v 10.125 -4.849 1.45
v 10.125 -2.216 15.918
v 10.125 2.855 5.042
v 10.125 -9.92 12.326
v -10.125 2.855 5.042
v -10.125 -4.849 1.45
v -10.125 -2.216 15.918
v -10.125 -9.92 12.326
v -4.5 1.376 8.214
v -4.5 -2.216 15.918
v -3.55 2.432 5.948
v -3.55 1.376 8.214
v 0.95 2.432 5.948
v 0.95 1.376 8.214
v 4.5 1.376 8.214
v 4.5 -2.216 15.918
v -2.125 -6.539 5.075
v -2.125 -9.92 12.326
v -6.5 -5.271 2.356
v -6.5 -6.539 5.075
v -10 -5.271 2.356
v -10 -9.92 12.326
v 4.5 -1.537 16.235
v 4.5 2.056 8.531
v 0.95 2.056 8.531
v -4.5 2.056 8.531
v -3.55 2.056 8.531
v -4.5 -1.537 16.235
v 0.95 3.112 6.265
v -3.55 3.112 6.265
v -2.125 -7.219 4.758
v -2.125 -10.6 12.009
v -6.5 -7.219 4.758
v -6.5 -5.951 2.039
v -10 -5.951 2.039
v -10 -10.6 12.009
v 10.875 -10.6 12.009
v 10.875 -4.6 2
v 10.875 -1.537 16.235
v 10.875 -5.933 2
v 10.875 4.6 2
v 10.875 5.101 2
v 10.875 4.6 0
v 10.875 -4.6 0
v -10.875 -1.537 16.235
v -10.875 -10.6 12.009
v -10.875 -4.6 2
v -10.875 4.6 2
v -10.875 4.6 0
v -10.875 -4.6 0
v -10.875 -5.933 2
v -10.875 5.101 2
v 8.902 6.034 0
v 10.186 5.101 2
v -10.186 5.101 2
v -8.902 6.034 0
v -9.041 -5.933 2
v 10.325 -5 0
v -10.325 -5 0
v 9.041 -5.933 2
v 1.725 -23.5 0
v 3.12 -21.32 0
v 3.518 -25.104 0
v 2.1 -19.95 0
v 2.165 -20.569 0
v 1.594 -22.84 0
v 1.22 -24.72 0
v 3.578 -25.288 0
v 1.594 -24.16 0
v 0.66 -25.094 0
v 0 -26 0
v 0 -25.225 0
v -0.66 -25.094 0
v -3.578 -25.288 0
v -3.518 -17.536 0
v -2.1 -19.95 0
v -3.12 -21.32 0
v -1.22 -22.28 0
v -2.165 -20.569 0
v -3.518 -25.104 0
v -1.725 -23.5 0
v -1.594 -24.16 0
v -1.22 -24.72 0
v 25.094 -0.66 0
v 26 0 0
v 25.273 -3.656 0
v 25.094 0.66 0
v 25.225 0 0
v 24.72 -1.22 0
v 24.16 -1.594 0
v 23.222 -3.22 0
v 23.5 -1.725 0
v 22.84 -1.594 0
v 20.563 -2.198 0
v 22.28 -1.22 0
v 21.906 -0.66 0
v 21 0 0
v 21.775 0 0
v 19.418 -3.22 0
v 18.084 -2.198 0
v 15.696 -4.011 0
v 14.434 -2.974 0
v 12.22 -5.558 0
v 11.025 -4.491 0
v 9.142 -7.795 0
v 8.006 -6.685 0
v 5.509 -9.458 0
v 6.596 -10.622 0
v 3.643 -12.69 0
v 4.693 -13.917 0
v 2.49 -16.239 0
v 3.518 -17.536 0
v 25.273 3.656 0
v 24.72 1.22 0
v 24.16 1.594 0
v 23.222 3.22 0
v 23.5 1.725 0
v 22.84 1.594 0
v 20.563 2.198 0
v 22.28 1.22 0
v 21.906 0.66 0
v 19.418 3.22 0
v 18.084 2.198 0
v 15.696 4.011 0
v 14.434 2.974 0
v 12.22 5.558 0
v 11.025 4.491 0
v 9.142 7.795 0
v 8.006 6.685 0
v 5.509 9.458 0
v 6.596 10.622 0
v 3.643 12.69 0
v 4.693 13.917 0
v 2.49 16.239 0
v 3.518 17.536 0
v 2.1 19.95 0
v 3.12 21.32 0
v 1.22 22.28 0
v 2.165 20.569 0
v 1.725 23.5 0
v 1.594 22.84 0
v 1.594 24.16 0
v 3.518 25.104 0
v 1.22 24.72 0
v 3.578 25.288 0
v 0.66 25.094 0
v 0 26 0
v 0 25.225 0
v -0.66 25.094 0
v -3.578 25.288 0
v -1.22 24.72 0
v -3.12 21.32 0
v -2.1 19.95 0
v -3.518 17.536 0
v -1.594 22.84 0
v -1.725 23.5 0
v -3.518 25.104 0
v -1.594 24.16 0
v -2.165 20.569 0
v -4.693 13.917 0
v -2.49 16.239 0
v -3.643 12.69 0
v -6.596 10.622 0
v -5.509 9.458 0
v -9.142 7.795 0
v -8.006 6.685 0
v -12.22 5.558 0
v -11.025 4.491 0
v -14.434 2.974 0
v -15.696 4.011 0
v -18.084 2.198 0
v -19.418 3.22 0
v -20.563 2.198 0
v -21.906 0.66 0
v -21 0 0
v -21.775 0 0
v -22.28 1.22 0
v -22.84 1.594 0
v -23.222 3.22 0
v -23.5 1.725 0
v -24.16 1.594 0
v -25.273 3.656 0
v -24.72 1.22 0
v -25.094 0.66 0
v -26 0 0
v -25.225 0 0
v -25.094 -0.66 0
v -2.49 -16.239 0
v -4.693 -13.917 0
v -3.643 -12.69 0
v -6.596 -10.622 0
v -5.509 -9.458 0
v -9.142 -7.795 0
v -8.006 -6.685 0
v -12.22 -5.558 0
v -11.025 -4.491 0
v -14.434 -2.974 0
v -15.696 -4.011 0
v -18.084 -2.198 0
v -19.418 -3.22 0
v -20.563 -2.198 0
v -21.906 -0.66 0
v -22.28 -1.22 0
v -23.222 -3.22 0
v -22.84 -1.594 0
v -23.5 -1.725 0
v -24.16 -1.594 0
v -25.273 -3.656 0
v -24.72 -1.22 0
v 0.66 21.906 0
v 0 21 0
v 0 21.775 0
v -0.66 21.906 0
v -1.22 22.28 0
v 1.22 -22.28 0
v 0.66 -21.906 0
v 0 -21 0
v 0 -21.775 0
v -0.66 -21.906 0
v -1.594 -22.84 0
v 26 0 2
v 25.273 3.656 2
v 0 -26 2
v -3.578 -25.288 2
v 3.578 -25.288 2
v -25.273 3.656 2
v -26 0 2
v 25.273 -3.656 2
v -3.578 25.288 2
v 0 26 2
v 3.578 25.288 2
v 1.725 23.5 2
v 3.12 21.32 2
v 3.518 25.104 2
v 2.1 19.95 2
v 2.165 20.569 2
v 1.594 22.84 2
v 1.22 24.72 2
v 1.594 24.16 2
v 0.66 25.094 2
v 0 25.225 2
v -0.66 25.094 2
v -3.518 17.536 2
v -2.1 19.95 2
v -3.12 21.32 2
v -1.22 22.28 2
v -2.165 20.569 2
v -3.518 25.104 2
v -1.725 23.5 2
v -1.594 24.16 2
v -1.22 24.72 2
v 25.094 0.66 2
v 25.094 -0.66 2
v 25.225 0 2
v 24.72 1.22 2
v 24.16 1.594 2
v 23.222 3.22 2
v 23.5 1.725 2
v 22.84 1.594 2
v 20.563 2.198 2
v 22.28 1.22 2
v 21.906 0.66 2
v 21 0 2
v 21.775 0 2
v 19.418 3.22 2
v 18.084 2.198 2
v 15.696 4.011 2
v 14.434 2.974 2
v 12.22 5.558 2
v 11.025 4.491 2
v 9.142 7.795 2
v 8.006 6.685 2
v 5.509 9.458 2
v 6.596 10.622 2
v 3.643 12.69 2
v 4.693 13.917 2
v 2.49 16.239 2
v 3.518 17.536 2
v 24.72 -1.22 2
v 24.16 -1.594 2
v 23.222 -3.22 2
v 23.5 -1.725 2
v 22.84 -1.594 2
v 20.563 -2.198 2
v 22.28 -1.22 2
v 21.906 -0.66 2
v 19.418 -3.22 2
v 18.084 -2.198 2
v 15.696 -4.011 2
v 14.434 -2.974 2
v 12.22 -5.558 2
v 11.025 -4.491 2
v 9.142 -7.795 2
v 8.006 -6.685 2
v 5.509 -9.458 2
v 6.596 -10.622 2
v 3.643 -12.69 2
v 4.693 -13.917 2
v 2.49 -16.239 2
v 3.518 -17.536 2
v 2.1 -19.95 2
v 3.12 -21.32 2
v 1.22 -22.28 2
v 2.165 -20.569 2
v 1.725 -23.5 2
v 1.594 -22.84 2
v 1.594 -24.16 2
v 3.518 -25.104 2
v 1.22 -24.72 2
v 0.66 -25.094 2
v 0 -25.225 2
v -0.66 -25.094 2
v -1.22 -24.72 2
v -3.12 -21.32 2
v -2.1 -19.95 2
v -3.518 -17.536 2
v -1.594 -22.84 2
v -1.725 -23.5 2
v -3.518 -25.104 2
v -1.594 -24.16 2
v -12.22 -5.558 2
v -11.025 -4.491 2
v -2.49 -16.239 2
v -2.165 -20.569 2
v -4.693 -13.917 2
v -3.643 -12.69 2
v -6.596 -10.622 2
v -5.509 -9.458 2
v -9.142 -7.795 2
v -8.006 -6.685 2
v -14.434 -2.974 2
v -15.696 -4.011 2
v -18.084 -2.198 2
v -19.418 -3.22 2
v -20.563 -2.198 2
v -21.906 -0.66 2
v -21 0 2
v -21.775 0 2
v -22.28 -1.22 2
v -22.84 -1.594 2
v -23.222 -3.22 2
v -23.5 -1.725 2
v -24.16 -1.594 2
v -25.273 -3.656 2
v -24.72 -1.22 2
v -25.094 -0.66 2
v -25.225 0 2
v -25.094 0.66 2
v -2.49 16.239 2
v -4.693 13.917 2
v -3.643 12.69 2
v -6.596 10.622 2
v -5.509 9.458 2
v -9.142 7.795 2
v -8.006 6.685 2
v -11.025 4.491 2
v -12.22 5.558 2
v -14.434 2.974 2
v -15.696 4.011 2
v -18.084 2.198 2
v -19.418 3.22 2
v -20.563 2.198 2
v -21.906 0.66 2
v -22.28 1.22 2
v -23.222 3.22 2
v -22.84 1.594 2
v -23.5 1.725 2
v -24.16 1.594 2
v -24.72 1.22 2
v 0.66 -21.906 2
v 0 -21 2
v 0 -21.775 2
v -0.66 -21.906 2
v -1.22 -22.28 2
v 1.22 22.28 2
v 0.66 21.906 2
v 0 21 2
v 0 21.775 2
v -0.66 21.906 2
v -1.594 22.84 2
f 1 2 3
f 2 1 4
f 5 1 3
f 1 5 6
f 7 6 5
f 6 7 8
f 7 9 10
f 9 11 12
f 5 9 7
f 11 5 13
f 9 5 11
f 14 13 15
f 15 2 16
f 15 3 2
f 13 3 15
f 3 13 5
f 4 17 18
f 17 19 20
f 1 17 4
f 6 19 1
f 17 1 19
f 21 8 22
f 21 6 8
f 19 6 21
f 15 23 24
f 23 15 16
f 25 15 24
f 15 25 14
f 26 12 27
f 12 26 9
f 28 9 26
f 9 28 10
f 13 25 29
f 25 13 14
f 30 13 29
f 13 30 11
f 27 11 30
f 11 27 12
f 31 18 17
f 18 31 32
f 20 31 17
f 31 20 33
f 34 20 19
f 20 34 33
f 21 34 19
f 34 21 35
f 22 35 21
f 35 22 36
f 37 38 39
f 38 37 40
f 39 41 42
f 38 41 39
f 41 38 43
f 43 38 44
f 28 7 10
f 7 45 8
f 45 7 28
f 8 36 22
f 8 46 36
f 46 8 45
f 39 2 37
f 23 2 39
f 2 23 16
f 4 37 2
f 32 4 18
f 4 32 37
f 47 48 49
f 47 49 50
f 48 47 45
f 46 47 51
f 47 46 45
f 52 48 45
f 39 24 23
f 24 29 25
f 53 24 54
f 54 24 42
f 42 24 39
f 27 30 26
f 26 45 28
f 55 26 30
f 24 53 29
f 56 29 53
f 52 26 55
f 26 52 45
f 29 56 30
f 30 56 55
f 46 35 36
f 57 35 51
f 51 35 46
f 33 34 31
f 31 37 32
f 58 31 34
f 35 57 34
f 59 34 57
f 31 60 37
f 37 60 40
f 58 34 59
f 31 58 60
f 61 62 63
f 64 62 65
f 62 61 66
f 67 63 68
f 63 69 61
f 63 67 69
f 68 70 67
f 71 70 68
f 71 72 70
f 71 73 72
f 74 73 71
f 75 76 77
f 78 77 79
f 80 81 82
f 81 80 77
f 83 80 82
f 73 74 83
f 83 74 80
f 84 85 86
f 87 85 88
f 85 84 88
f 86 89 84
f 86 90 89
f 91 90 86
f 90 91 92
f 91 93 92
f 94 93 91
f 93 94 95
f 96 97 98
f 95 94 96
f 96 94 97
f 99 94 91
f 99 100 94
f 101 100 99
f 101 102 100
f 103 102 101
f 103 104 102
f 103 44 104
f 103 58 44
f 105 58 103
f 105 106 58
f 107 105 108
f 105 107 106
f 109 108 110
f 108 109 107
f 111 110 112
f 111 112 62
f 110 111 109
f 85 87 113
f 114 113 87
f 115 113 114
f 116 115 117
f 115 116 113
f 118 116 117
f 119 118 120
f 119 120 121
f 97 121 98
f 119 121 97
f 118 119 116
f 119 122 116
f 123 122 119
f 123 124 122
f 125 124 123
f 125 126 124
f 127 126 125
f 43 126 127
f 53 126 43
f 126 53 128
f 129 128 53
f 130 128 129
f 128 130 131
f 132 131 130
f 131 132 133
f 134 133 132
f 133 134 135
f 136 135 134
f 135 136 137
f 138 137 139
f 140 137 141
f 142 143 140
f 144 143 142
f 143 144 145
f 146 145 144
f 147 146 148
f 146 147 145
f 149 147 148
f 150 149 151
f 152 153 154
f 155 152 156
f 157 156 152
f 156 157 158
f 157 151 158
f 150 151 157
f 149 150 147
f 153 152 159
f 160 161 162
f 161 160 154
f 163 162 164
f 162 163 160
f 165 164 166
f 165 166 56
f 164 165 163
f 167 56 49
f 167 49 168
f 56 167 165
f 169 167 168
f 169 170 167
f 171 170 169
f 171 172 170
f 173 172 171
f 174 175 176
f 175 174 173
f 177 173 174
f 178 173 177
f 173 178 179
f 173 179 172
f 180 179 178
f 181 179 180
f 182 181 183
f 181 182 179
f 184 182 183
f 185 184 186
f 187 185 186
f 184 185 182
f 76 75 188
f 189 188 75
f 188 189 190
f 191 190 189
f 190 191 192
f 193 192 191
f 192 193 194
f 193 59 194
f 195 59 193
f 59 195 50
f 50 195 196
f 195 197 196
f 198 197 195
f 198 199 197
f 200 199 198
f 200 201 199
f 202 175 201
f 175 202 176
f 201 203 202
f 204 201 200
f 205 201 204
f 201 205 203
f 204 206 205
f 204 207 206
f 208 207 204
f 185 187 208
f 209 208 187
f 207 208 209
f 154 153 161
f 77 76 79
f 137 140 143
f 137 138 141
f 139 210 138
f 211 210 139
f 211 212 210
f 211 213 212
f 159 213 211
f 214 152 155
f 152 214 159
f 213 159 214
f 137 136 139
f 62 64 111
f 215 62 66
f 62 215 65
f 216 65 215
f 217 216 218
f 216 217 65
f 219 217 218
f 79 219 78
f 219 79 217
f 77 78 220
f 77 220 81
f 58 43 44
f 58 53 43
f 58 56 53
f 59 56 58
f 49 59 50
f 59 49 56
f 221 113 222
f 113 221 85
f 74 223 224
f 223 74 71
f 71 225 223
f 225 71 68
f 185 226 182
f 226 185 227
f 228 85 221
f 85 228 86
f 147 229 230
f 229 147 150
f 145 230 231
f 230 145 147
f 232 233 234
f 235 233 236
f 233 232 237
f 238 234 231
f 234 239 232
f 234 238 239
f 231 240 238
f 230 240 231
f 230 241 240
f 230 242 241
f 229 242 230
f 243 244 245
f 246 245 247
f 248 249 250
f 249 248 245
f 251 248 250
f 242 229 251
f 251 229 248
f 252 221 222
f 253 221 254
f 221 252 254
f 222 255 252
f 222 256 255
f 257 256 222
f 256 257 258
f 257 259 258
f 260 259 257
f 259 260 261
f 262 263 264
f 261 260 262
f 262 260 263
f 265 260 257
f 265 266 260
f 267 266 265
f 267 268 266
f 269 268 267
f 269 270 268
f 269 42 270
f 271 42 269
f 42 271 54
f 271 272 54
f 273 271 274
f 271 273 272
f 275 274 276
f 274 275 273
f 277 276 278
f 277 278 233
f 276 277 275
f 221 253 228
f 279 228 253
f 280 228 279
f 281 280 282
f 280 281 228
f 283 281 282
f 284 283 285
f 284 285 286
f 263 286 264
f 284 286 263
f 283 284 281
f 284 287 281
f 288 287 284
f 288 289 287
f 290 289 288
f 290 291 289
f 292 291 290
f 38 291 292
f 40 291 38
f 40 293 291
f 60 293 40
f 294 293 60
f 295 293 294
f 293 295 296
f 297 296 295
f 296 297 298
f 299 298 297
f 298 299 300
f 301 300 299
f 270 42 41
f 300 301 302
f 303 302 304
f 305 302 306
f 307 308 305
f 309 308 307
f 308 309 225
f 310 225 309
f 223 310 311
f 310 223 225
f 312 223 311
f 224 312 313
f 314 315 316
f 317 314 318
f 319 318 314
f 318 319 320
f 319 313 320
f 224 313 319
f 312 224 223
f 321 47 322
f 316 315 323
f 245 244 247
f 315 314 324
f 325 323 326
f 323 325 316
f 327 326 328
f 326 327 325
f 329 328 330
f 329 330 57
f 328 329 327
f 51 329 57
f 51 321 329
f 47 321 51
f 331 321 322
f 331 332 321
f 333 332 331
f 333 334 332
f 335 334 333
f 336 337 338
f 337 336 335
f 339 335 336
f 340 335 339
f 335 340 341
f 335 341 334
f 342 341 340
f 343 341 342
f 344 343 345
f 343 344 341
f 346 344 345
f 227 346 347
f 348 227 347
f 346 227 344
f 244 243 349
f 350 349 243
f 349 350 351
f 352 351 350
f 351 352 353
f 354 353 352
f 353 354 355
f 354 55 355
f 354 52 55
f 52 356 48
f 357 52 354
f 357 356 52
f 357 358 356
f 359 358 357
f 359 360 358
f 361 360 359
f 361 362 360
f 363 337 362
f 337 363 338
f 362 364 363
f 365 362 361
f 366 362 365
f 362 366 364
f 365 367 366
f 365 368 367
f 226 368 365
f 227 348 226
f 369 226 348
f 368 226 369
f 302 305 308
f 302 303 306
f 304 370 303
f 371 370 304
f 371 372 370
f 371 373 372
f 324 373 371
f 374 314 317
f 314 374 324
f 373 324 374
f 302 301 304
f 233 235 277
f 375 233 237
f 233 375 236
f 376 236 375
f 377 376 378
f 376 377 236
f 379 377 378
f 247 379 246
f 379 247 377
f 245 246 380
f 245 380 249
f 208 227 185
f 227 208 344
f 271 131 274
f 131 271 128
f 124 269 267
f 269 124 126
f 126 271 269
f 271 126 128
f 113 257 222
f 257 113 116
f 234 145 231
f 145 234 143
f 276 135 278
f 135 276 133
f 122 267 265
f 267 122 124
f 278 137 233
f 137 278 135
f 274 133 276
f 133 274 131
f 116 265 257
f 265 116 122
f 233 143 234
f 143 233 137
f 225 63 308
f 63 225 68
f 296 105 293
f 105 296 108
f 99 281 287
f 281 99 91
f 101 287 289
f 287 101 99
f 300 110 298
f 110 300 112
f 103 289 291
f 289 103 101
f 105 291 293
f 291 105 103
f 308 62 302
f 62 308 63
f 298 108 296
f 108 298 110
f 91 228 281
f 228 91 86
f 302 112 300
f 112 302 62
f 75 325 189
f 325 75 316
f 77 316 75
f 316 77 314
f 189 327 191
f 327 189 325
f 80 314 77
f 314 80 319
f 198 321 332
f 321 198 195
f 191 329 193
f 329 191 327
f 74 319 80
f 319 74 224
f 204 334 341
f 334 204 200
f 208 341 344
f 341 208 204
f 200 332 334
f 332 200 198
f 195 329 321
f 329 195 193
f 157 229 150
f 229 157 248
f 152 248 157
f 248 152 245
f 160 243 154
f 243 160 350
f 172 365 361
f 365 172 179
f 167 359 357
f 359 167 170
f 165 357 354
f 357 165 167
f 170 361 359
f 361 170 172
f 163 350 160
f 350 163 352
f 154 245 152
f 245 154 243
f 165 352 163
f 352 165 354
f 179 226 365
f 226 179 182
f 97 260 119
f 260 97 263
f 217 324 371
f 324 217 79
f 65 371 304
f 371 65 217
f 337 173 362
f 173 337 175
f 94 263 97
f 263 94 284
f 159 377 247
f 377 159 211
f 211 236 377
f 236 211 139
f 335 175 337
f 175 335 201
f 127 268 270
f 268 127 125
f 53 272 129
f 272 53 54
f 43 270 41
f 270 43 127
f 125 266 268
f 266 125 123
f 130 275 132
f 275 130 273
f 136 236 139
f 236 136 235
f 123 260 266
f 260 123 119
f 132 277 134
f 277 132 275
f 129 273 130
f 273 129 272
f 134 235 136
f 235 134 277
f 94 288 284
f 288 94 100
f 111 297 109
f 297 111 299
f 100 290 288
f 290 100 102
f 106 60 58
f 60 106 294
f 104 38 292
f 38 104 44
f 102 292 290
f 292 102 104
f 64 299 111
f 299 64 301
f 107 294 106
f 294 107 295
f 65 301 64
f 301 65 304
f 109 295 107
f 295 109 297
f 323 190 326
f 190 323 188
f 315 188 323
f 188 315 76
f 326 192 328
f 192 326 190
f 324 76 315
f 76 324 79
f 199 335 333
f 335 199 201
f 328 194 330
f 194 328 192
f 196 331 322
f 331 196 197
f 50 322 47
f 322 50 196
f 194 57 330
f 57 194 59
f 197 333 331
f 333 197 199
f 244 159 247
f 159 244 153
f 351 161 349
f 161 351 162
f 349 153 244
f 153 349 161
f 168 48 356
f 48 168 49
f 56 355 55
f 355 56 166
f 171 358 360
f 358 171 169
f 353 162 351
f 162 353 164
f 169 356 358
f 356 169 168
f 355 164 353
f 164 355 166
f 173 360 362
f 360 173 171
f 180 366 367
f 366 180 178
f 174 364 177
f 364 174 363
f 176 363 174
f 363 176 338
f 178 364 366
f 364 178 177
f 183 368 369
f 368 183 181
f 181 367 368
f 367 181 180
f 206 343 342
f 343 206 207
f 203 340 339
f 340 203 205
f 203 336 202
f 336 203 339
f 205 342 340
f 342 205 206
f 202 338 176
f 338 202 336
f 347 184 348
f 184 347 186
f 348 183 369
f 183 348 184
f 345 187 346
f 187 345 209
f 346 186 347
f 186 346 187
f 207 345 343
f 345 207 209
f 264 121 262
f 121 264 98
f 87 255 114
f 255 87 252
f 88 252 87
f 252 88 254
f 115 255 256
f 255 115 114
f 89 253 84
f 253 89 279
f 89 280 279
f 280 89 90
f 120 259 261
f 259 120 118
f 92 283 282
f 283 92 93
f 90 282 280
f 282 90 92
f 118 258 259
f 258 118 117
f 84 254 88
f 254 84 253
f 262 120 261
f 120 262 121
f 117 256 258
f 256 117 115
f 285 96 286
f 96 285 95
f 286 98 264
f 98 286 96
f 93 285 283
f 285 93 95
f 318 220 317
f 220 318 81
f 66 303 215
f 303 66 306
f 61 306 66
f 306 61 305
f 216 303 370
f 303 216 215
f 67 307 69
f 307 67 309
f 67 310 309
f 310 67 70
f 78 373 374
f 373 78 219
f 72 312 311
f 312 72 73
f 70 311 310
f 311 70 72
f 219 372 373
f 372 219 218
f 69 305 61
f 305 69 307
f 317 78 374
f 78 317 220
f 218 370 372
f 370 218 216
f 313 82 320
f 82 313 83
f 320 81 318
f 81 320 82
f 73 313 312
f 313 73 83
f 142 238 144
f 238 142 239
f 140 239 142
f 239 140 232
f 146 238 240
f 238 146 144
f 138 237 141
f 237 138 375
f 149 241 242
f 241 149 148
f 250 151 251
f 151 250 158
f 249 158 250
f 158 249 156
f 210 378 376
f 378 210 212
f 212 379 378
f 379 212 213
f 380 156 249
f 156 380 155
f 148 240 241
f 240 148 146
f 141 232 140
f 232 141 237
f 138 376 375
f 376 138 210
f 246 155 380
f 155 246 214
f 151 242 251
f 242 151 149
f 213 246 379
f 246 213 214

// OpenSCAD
/* [Camera box] */

// Camera box angle
CAMERABOX_ANGLE = 25;
// Camera box height
CAMERABOX_HEIGHT = 12;
// Camera box wall thickness
CAMERABOX_WALL_THICKNESS = 1.5;
// Extra height at bottom of the box
CAMERABOX_ZOFFSET = 1.25;

/* [Customize camera] */
// Draw camera (debug mode)
CAMERA_DEBUG="false";

// Camera width
CAMERA_WIDTH = 20.25;
// Camera depth
CAMERA_DEPTH = 8.5;
// Camera height
CAMERA_HEIGHT = 14;

// Lens width
CAMERA_LENS_WIDTH = 9;
// Lens height
CAMERA_LENS_HEIGHT = 7;
// Lens depth
CAMERA_LENS_DEPTH = 7;
// Lens cutout offset X from center of camera
CAMERA_LENS_XOFFSET = 0;
// Lens offset Z from center of camera
CAMERA_LENS_ZOFFSET = 0;

// Front capacitor width
CAMERA_CAP_WIDTH=4.5;
// Front capacitor height
CAMERA_CAP_HEIGHT = 2.5;
// Front capacitor depth
CAMERA_CAP_DEPTH = 1.5;
// Front capacitor X offset from center of lens
CAMERA_CAP_XOFFSET = -1.3;
// Front capacitor Y offset from center of the lens
CAMERA_CAP_ZOFFSET = -4.75;

// Rear LCD width
CAMERA_LCD_WIDTH = 7.75;
// Rear LCD height
CAMERA_LCD_HEIGHT = 9;
// Rear LCD depth
CAMERA_LCD_DEPTH = 2;
// Rear LCD X offset
CAMERA_LCD_XOFFSET = -6;
// Rear LCD Z offset
CAMERA_LCD_ZOFFSET = 1.5;

// Power cord's connector width
CAMERA_POWERCORD_WIDTH=3.5;
// Power cord's connector height
CAMERA_POWERCORD_HEIGHT=2;
// Power cord's connector depth
CAMERA_POWERCORD_DEPTH=1.5;
// Power cord's hole X offset
CAMERA_POWERCORD_XOFFSET = -8.25;
// Power cord's hole z offset
CAMERA_POWERCORD_ZOFFSET = -5;

/* [Customize Camera box (advanced)] */
// Custom camera box width (empty is default)
CAMERABOX_WIDTH = CAMERA_WIDTH + CAMERABOX_WALL_THICKNESS;
// Custom camera box depth (empty is default)
CAMERABOX_DEPTH = CAMERA_DEPTH + CAMERABOX_WALL_THICKNESS;;

/* [Customize support plate] */
// Spacing between frame's holes
PLATE_HOLE_SPACING = 47;
// Hole's diameter
PLATE_HOLE_DIAMETER = 3;
// Extra width between frame's holes center and the support plate's outer edge
PLATE_INNER_WIDTH = 2.5;
// height of the plate
PLATE_THICKNESS = 2;
// Yaw offset, use 45 for "X" frame, 0 for "+" frame
PLATE_YAW_OFFSET = 0;
// X offset for the plate
PLATE_XOFFSET = 0;
// y offset for the plate
PLATE_YOFFSET = 0;
// z offset for the plate
PLATE_ZOFFSET = 1;

/* [Customize support plate (advanced)] */
// Radius of the plate
PLATE_RADIUS = (PLATE_HOLE_SPACING + (PLATE_INNER_WIDTH * 2)) / 2.0;

// Outer cut's radius
PLATE_OUTERCUT_RADIUS = 0.7 * PLATE_RADIUS;
// Outer cut's distance from the plate's center
PLATE_OUTERCUT_CENTER_DISTANCE = 0.82 * PLATE_RADIUS;

// Inner radius
PLATE_INNER_RADIUS = (PLATE_HOLE_SPACING - (PLATE_INNER_WIDTH * 2)) / 2.0;
// Inner cut's radius
PLATE_INNERCUT_RADIUS = 0.85 * PLATE_INNER_RADIUS;
// Inner cut's distance from the plate's center
PLATE_INNERCUT_CENTER_DISTANCE = 0.95 * PLATE_INNER_RADIUS;

// Adjustment coefficient for the hole's diameter (makes the hole a bit larger to accomodate higher flow rate)
PLATE_HOLE_DIAMETER_ADJUST = 0.15;

/* RENDER EVERYTHING */
camerabox();
plate();

/* DRAW PLATE */
module plate() {
    translate([PLATE_XOFFSET, PLATE_YOFFSET, PLATE_ZOFFSET])
        rotate([0, 0, PLATE_YAW_OFFSET])
            difference() {
                // Outer
                partialPlate(PLATE_RADIUS, PLATE_THICKNESS, PLATE_OUTERCUT_RADIUS, PLATE_OUTERCUT_CENTER_DISTANCE);
                // Inner
                partialPlate(PLATE_INNER_RADIUS, 1.1 * PLATE_THICKNESS, PLATE_INNERCUT_RADIUS, PLATE_INNERCUT_CENTER_DISTANCE);
                // Holes
                PLATE_HOLE_RADIUS = ((PLATE_HOLE_DIAMETER * PLATE_HOLE_DIAMETER_ADJUST) + PLATE_HOLE_DIAMETER) / 2;
                translate([-PLATE_HOLE_SPACING / 2.0, 0, 0])        
                    cylinder(r=PLATE_HOLE_RADIUS, h=1.1*PLATE_THICKNESS, center=true, $fn=16);
                translate([PLATE_HOLE_SPACING / 2.0, 0, 0])
                    cylinder(r=PLATE_HOLE_RADIUS, h=1.1*PLATE_THICKNESS, center=true, $fn=16);
                translate([0, -PLATE_HOLE_SPACING / 2.0, 0])
                    cylinder(r=PLATE_HOLE_RADIUS, h=1.1*PLATE_THICKNESS, center=true, $fn=16);
                translate([0, PLATE_HOLE_SPACING / 2.0, 0])
                    cylinder(r=PLATE_HOLE_RADIUS, h=1.1*PLATE_THICKNESS, center=true, $fn=16);
            }
}
        
module partialPlate(RADIUS, THICKNESS, CUT_RADIUS, CUT_DISTANCE) {
    difference() {
		cylinder(r=RADIUS, h=THICKNESS, center=true, $fn=16);        
		translate([CUT_DISTANCE, CUT_DISTANCE, 0])
			cylinder(r=CUT_RADIUS, h=THICKNESS + 1, center=true);
		translate([CUT_DISTANCE, -CUT_DISTANCE, 0])
			cylinder(r=CUT_RADIUS, h=THICKNESS + 1, center=true);
		translate([-CUT_DISTANCE, -CUT_DISTANCE, 0])
			cylinder(r=CUT_RADIUS, h=THICKNESS + 1, center=true);        
		translate([-CUT_DISTANCE, CUT_DISTANCE, 0])
			cylinder(r=CUT_RADIUS, h=THICKNESS + 1, center=true);
	}
}

/* DRAW CAMERA BOX */
module camerabox() {
    translate([-CAMERABOX_WIDTH/2, -CAMERABOX_DEPTH/2, 0]) { // Center model
        /* Draw camera box */
        difference() {
            rotate ([CAMERABOX_ANGLE, 0, 0]) {
                difference() {
                    undersideExtraHeight = (CAMERABOX_ANGLE + 1) / 3;
                    translate([0, 0, -undersideExtraHeight])
                    cube([CAMERABOX_WIDTH, CAMERABOX_DEPTH, CAMERABOX_HEIGHT + CAMERABOX_ZOFFSET + undersideExtraHeight]);
                    translate([CAMERABOX_WIDTH / 2 - CAMERA_WIDTH / 2, CAMERABOX_DEPTH / 2 - CAMERA_DEPTH / 2, CAMERABOX_ZOFFSET])
                        for(z = [CAMERABOX_HEIGHT : 0]) translate([0,0,z]) camera();
                }
                
            }
            /* Cut bottom flat */
            translate ([-1, -CAMERABOX_HEIGHT, -CAMERABOX_HEIGHT*2])
                cube([ CAMERABOX_WIDTH + 2, CAMERABOX_DEPTH*3, CAMERABOX_HEIGHT*2]);
        }

        /* Draw camera (debug) */
        if (CAMERA_DEBUG == "true") {
            rotate ([CAMERABOX_ANGLE, 0, 0]) 
                translate([CAMERABOX_WIDTH / 2 - CAMERA_WIDTH / 2, CAMERABOX_DEPTH / 2 - CAMERA_DEPTH / 2, CAMERABOX_ZOFFSET])
                    camera();
        }
    }
}

/* DRAW CAMERA */
module camera() {
    translate([CAMERA_WIDTH / 2, CAMERA_DEPTH / 2, CAMERA_HEIGHT / 2]) {
        /* Body */
        color("darkgreen") cube([CAMERA_WIDTH, CAMERA_DEPTH, CAMERA_HEIGHT], center = true);
        /* Lens */
        translate([CAMERA_LENS_XOFFSET, 0, CAMERA_LENS_ZOFFSET])
            translate([0, CAMERA_DEPTH / 2 + CAMERA_LENS_DEPTH / 2, 0])
                color("darkgrey") cube([CAMERA_LENS_WIDTH, CAMERA_LENS_DEPTH, CAMERA_LENS_HEIGHT], center = true);
        /* Capacitor */
        translate([CAMERA_CAP_XOFFSET, 0, CAMERA_CAP_ZOFFSET])
            translate([0, CAMERA_DEPTH / 2 + CAMERA_CAP_DEPTH / 2, 0])
                color("yellow") cube([CAMERA_CAP_WIDTH, CAMERA_CAP_DEPTH, CAMERA_CAP_HEIGHT], center = true);
        /* Rear LCD */
        translate([CAMERA_LCD_XOFFSET, 0, CAMERA_LCD_ZOFFSET])
            translate([0, -  (CAMERA_DEPTH / 2 + CAMERA_LCD_DEPTH / 2), 0])
                color("grey") cube([CAMERA_LCD_WIDTH, CAMERA_LCD_DEPTH, CAMERA_LCD_HEIGHT], center = true);
        /* Power cord */
        translate([CAMERA_POWERCORD_XOFFSET, 0, CAMERA_POWERCORD_ZOFFSET])
            translate([0, -  (CAMERA_DEPTH / 2 + CAMERA_POWERCORD_DEPTH / 2), 0])
                color("black") cube([CAMERA_POWERCORD_WIDTH, CAMERA_POWERCORD_DEPTH, CAMERA_POWERCORD_HEIGHT], center = true);
    }
}
